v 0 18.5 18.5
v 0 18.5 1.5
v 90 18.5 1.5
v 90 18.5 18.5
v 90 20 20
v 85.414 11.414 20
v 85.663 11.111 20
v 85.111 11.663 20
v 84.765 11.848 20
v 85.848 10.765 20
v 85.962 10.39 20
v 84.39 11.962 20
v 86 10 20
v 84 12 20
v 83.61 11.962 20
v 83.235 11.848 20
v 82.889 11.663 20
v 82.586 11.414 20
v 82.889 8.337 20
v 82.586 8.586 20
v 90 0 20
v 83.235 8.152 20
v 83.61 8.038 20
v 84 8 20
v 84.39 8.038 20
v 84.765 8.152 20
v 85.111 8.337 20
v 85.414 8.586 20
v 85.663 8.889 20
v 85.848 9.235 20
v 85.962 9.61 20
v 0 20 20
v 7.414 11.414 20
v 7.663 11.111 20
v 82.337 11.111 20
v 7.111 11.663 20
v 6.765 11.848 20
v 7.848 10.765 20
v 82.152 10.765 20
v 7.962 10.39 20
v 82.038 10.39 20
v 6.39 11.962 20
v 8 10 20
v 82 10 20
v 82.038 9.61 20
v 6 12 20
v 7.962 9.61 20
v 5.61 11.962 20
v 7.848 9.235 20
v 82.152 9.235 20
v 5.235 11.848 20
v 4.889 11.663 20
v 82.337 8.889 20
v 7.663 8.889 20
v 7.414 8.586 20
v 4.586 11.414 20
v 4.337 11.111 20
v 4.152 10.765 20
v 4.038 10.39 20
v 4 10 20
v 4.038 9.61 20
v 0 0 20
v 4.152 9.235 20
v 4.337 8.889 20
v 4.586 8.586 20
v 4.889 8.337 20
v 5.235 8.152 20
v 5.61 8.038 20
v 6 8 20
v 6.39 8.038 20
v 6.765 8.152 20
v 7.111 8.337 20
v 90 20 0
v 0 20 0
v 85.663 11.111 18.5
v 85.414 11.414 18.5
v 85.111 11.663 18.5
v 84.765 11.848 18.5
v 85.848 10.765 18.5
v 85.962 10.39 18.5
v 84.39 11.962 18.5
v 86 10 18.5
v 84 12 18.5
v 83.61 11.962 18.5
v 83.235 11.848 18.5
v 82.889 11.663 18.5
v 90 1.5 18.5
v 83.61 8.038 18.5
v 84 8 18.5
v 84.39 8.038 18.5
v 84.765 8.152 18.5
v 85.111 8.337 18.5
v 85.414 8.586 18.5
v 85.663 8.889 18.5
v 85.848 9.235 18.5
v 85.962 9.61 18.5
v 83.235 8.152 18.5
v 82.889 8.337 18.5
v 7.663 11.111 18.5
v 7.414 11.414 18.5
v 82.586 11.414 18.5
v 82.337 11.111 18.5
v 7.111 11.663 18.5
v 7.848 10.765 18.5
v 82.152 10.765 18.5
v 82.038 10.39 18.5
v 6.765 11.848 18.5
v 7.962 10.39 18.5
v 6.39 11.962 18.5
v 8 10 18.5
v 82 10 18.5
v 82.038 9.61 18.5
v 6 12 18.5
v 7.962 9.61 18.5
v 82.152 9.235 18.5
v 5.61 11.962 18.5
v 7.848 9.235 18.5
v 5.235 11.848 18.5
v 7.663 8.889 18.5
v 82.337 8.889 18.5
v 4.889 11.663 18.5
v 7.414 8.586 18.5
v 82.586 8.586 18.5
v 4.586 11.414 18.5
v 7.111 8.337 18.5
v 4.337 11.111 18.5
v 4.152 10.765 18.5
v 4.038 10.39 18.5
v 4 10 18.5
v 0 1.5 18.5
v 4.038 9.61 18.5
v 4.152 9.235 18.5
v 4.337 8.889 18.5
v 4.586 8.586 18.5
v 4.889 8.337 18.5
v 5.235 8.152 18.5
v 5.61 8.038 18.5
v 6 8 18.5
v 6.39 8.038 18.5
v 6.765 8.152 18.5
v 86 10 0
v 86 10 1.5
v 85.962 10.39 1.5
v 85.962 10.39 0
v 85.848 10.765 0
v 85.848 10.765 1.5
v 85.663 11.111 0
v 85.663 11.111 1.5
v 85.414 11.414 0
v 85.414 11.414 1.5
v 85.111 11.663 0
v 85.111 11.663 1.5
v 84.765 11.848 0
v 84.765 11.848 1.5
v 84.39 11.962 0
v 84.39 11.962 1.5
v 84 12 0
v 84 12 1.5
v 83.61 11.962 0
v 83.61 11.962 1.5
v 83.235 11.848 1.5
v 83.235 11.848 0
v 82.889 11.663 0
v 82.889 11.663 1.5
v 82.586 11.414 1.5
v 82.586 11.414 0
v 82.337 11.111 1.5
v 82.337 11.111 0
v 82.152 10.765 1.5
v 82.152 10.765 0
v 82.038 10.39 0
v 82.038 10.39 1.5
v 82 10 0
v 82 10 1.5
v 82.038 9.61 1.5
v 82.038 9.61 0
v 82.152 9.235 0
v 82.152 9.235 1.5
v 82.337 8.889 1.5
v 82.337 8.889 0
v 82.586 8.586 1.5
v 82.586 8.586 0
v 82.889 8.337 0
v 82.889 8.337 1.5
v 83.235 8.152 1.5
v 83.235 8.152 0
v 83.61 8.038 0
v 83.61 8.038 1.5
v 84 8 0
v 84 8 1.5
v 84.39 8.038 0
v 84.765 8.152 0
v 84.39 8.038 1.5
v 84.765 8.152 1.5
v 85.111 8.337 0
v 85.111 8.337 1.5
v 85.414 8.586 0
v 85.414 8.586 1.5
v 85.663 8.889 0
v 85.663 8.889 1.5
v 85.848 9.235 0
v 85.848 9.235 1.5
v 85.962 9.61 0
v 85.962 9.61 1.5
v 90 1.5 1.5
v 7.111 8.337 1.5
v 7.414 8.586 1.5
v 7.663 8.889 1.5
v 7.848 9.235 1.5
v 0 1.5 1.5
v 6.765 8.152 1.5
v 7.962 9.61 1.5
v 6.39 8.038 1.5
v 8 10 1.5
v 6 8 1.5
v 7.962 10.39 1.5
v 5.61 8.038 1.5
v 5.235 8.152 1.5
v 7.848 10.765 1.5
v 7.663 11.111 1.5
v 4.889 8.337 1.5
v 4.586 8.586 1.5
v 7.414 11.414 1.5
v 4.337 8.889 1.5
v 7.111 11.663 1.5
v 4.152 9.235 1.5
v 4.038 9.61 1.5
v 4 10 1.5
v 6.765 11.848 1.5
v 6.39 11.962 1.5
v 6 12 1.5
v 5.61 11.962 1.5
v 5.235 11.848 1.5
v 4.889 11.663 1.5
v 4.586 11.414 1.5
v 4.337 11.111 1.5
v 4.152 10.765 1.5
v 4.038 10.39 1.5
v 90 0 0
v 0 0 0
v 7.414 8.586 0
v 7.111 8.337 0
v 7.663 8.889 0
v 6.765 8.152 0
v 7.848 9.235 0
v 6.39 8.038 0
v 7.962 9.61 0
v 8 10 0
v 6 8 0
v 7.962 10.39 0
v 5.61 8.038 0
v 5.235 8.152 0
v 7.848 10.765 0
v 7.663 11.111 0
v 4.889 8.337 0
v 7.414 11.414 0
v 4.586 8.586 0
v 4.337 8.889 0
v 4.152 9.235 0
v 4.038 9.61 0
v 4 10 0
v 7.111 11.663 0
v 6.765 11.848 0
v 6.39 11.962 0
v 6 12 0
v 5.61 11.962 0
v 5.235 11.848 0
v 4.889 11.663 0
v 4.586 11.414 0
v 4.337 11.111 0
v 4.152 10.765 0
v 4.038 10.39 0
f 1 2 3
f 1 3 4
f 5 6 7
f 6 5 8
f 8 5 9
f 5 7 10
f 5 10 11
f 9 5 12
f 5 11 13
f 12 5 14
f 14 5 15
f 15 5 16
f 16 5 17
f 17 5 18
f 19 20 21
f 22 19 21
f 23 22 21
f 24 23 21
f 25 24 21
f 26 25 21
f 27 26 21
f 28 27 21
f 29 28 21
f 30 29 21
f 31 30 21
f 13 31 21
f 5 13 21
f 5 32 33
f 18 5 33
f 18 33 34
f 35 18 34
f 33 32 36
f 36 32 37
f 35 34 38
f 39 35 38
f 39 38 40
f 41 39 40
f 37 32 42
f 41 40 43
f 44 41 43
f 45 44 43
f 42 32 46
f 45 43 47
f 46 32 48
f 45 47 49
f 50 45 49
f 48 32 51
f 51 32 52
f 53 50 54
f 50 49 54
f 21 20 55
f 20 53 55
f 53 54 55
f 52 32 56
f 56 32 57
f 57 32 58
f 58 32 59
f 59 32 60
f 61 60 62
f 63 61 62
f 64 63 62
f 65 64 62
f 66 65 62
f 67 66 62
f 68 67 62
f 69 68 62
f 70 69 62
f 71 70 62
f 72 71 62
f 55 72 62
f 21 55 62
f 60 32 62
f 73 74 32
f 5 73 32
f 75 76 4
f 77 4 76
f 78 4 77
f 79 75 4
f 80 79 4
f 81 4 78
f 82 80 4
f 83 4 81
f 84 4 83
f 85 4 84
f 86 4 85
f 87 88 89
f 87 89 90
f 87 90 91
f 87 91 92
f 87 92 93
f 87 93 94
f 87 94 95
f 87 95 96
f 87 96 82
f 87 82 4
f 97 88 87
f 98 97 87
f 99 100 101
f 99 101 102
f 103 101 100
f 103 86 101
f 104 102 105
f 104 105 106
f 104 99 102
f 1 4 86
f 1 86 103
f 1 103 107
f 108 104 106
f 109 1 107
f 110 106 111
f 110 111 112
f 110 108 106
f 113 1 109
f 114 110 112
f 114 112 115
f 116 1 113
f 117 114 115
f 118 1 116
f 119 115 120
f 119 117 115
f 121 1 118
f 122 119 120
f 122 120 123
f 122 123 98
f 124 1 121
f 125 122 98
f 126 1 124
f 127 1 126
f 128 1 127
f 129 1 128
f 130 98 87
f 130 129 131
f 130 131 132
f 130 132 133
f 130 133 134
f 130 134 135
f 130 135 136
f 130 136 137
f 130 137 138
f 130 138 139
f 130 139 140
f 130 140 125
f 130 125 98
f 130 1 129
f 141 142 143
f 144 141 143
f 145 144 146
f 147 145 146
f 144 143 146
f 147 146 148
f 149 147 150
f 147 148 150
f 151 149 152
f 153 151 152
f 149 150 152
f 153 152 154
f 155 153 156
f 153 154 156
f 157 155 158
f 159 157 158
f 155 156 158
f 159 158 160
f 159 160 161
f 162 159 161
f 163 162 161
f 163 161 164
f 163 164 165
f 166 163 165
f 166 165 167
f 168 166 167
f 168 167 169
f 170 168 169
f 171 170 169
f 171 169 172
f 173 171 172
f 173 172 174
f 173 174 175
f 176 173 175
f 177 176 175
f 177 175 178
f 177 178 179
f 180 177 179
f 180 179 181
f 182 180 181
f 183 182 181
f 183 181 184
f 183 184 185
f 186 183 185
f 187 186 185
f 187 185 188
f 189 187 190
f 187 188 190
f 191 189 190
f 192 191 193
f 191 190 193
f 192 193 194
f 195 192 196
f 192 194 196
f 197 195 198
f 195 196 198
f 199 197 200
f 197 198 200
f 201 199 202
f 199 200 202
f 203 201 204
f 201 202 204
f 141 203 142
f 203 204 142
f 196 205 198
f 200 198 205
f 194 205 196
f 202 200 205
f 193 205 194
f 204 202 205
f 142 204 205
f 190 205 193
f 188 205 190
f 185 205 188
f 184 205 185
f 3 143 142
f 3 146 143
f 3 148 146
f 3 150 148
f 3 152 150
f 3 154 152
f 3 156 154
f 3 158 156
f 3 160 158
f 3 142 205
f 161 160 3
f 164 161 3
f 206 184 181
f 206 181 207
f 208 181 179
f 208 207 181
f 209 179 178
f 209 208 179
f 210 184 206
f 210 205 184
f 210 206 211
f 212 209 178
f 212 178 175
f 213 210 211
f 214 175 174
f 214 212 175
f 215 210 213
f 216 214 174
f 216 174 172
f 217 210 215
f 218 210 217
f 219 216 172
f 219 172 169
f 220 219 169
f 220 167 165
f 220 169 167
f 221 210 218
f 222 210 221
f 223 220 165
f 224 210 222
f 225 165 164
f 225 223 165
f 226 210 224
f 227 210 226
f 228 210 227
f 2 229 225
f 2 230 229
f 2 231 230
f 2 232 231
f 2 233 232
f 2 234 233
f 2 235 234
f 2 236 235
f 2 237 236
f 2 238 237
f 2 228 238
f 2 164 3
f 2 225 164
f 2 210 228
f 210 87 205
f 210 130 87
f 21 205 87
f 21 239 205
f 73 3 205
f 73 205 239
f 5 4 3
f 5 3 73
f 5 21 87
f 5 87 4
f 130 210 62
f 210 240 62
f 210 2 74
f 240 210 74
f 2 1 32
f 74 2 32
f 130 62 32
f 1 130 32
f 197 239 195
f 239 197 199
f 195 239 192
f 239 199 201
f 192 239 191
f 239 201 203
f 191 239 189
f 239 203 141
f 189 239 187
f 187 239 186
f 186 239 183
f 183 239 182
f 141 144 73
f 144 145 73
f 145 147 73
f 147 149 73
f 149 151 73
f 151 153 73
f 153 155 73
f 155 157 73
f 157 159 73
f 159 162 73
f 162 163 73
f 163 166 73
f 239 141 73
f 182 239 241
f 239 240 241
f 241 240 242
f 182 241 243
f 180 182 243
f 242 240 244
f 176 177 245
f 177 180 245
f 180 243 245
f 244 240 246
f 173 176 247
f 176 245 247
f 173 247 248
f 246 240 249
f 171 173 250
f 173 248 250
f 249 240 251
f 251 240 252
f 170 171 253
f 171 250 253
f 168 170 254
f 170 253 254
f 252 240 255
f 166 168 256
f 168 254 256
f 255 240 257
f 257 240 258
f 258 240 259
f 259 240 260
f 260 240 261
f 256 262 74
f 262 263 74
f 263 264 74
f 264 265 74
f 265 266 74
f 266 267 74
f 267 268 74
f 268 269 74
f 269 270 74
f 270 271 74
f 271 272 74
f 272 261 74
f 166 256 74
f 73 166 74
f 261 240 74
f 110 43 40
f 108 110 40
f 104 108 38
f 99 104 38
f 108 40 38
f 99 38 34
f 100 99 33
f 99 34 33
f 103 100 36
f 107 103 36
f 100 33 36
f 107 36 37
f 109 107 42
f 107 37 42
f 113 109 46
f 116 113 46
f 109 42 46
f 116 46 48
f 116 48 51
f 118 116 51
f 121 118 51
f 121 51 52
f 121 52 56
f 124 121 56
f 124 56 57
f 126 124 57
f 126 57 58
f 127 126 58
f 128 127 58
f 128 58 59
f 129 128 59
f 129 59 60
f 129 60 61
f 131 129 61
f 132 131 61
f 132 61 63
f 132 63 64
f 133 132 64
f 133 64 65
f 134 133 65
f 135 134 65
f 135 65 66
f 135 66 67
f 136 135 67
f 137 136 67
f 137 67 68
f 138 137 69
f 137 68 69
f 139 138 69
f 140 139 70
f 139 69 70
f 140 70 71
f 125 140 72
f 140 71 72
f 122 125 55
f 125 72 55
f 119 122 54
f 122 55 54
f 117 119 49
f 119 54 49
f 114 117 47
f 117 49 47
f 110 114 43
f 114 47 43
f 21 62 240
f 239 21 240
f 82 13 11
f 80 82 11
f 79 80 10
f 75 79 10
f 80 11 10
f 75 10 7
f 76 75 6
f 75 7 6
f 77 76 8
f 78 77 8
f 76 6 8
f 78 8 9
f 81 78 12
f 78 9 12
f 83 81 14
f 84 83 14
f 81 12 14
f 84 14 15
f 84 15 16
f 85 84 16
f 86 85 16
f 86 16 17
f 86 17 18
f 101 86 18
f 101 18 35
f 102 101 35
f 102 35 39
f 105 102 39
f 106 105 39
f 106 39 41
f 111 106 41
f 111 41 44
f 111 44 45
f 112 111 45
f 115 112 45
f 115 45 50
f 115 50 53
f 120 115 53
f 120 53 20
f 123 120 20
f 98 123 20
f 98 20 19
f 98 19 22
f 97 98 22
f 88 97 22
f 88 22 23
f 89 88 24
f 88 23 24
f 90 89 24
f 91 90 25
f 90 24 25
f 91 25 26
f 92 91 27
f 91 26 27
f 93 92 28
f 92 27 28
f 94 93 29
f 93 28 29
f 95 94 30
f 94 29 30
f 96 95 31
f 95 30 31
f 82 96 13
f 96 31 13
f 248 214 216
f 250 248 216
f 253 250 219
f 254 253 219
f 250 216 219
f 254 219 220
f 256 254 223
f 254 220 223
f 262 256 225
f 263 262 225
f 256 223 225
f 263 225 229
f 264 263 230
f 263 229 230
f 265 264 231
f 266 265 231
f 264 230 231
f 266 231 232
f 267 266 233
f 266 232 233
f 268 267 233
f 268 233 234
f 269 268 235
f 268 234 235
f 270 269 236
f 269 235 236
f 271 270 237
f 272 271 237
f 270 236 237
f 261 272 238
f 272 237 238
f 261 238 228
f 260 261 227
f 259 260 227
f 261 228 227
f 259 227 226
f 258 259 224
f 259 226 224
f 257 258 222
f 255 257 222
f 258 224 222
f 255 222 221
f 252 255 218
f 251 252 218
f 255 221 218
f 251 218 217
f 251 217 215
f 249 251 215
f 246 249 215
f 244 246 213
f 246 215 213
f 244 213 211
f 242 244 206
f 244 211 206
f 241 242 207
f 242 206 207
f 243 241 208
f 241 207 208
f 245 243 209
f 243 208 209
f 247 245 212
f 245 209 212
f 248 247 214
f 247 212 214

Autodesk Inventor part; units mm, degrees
ref_plane "YZ Plane" through (0, 0, 0) normal (1, 0, 0) x (0, 1, 0)
ref_plane "XZ Plane" through (0, 0, 0) normal (0, 1, 0) x (-1, 0, 0)
ref_plane "XY Plane" through (0, 0, 0) normal (0, 0, 1) x (1, 0, 0)
sketch "Эскиз2" plane through (0, 0, 0) normal (1, 0, 0) x (0, 1, 0)
  line L0 (0, 0) -> (20, 0)
  line L1 (20, 0) -> (20, 20)
  line L2 (20, 20) -> (0, 20)
  line L3 (0, 20) -> (0, 0)
  line L4 (18.5, 18.5) -> (1.5, 18.5)
  line L5 (1.5, 18.5) -> (1.5, 1.5)
  line L6 (1.5, 1.5) -> (18.5, 1.5)
  line L7 (18.5, 1.5) -> (18.5, 18.5)
  point P0 (10, 18.5)
  point P1 (10, 20)
  point P2 (18.5, 10)
  point P3 (20, 10)
  dimension "d0" = 20
  dimension "d1" = 1.5
extrude "Выдавливание1" add sketch "Эскиз2" along normal blind 90
sketch "Эскиз3" plane through (0, 0, 20) normal (0, 0, 1) x (1, 0, 0)
  circle A0 centre (6, 10) radius 2
  circle A1 centre (84, 10) radius 2
  line L0 (90, 20) -> (90, 0) projected
  line L1 (0, 20) -> (0, 0) projected
  point P0 (90, 10)
  point P1 (0, 10)
  point P2 (90, 10)
  point P3 (0, 10)
  dimension "d6" = 6
  dimension "d7" = 6
  dimension "d10" = 4
extrude "Выдавливание2" cut sketch "Эскиз3" against normal through all
equation "\"d7\" = d6"
properties part number "section"
